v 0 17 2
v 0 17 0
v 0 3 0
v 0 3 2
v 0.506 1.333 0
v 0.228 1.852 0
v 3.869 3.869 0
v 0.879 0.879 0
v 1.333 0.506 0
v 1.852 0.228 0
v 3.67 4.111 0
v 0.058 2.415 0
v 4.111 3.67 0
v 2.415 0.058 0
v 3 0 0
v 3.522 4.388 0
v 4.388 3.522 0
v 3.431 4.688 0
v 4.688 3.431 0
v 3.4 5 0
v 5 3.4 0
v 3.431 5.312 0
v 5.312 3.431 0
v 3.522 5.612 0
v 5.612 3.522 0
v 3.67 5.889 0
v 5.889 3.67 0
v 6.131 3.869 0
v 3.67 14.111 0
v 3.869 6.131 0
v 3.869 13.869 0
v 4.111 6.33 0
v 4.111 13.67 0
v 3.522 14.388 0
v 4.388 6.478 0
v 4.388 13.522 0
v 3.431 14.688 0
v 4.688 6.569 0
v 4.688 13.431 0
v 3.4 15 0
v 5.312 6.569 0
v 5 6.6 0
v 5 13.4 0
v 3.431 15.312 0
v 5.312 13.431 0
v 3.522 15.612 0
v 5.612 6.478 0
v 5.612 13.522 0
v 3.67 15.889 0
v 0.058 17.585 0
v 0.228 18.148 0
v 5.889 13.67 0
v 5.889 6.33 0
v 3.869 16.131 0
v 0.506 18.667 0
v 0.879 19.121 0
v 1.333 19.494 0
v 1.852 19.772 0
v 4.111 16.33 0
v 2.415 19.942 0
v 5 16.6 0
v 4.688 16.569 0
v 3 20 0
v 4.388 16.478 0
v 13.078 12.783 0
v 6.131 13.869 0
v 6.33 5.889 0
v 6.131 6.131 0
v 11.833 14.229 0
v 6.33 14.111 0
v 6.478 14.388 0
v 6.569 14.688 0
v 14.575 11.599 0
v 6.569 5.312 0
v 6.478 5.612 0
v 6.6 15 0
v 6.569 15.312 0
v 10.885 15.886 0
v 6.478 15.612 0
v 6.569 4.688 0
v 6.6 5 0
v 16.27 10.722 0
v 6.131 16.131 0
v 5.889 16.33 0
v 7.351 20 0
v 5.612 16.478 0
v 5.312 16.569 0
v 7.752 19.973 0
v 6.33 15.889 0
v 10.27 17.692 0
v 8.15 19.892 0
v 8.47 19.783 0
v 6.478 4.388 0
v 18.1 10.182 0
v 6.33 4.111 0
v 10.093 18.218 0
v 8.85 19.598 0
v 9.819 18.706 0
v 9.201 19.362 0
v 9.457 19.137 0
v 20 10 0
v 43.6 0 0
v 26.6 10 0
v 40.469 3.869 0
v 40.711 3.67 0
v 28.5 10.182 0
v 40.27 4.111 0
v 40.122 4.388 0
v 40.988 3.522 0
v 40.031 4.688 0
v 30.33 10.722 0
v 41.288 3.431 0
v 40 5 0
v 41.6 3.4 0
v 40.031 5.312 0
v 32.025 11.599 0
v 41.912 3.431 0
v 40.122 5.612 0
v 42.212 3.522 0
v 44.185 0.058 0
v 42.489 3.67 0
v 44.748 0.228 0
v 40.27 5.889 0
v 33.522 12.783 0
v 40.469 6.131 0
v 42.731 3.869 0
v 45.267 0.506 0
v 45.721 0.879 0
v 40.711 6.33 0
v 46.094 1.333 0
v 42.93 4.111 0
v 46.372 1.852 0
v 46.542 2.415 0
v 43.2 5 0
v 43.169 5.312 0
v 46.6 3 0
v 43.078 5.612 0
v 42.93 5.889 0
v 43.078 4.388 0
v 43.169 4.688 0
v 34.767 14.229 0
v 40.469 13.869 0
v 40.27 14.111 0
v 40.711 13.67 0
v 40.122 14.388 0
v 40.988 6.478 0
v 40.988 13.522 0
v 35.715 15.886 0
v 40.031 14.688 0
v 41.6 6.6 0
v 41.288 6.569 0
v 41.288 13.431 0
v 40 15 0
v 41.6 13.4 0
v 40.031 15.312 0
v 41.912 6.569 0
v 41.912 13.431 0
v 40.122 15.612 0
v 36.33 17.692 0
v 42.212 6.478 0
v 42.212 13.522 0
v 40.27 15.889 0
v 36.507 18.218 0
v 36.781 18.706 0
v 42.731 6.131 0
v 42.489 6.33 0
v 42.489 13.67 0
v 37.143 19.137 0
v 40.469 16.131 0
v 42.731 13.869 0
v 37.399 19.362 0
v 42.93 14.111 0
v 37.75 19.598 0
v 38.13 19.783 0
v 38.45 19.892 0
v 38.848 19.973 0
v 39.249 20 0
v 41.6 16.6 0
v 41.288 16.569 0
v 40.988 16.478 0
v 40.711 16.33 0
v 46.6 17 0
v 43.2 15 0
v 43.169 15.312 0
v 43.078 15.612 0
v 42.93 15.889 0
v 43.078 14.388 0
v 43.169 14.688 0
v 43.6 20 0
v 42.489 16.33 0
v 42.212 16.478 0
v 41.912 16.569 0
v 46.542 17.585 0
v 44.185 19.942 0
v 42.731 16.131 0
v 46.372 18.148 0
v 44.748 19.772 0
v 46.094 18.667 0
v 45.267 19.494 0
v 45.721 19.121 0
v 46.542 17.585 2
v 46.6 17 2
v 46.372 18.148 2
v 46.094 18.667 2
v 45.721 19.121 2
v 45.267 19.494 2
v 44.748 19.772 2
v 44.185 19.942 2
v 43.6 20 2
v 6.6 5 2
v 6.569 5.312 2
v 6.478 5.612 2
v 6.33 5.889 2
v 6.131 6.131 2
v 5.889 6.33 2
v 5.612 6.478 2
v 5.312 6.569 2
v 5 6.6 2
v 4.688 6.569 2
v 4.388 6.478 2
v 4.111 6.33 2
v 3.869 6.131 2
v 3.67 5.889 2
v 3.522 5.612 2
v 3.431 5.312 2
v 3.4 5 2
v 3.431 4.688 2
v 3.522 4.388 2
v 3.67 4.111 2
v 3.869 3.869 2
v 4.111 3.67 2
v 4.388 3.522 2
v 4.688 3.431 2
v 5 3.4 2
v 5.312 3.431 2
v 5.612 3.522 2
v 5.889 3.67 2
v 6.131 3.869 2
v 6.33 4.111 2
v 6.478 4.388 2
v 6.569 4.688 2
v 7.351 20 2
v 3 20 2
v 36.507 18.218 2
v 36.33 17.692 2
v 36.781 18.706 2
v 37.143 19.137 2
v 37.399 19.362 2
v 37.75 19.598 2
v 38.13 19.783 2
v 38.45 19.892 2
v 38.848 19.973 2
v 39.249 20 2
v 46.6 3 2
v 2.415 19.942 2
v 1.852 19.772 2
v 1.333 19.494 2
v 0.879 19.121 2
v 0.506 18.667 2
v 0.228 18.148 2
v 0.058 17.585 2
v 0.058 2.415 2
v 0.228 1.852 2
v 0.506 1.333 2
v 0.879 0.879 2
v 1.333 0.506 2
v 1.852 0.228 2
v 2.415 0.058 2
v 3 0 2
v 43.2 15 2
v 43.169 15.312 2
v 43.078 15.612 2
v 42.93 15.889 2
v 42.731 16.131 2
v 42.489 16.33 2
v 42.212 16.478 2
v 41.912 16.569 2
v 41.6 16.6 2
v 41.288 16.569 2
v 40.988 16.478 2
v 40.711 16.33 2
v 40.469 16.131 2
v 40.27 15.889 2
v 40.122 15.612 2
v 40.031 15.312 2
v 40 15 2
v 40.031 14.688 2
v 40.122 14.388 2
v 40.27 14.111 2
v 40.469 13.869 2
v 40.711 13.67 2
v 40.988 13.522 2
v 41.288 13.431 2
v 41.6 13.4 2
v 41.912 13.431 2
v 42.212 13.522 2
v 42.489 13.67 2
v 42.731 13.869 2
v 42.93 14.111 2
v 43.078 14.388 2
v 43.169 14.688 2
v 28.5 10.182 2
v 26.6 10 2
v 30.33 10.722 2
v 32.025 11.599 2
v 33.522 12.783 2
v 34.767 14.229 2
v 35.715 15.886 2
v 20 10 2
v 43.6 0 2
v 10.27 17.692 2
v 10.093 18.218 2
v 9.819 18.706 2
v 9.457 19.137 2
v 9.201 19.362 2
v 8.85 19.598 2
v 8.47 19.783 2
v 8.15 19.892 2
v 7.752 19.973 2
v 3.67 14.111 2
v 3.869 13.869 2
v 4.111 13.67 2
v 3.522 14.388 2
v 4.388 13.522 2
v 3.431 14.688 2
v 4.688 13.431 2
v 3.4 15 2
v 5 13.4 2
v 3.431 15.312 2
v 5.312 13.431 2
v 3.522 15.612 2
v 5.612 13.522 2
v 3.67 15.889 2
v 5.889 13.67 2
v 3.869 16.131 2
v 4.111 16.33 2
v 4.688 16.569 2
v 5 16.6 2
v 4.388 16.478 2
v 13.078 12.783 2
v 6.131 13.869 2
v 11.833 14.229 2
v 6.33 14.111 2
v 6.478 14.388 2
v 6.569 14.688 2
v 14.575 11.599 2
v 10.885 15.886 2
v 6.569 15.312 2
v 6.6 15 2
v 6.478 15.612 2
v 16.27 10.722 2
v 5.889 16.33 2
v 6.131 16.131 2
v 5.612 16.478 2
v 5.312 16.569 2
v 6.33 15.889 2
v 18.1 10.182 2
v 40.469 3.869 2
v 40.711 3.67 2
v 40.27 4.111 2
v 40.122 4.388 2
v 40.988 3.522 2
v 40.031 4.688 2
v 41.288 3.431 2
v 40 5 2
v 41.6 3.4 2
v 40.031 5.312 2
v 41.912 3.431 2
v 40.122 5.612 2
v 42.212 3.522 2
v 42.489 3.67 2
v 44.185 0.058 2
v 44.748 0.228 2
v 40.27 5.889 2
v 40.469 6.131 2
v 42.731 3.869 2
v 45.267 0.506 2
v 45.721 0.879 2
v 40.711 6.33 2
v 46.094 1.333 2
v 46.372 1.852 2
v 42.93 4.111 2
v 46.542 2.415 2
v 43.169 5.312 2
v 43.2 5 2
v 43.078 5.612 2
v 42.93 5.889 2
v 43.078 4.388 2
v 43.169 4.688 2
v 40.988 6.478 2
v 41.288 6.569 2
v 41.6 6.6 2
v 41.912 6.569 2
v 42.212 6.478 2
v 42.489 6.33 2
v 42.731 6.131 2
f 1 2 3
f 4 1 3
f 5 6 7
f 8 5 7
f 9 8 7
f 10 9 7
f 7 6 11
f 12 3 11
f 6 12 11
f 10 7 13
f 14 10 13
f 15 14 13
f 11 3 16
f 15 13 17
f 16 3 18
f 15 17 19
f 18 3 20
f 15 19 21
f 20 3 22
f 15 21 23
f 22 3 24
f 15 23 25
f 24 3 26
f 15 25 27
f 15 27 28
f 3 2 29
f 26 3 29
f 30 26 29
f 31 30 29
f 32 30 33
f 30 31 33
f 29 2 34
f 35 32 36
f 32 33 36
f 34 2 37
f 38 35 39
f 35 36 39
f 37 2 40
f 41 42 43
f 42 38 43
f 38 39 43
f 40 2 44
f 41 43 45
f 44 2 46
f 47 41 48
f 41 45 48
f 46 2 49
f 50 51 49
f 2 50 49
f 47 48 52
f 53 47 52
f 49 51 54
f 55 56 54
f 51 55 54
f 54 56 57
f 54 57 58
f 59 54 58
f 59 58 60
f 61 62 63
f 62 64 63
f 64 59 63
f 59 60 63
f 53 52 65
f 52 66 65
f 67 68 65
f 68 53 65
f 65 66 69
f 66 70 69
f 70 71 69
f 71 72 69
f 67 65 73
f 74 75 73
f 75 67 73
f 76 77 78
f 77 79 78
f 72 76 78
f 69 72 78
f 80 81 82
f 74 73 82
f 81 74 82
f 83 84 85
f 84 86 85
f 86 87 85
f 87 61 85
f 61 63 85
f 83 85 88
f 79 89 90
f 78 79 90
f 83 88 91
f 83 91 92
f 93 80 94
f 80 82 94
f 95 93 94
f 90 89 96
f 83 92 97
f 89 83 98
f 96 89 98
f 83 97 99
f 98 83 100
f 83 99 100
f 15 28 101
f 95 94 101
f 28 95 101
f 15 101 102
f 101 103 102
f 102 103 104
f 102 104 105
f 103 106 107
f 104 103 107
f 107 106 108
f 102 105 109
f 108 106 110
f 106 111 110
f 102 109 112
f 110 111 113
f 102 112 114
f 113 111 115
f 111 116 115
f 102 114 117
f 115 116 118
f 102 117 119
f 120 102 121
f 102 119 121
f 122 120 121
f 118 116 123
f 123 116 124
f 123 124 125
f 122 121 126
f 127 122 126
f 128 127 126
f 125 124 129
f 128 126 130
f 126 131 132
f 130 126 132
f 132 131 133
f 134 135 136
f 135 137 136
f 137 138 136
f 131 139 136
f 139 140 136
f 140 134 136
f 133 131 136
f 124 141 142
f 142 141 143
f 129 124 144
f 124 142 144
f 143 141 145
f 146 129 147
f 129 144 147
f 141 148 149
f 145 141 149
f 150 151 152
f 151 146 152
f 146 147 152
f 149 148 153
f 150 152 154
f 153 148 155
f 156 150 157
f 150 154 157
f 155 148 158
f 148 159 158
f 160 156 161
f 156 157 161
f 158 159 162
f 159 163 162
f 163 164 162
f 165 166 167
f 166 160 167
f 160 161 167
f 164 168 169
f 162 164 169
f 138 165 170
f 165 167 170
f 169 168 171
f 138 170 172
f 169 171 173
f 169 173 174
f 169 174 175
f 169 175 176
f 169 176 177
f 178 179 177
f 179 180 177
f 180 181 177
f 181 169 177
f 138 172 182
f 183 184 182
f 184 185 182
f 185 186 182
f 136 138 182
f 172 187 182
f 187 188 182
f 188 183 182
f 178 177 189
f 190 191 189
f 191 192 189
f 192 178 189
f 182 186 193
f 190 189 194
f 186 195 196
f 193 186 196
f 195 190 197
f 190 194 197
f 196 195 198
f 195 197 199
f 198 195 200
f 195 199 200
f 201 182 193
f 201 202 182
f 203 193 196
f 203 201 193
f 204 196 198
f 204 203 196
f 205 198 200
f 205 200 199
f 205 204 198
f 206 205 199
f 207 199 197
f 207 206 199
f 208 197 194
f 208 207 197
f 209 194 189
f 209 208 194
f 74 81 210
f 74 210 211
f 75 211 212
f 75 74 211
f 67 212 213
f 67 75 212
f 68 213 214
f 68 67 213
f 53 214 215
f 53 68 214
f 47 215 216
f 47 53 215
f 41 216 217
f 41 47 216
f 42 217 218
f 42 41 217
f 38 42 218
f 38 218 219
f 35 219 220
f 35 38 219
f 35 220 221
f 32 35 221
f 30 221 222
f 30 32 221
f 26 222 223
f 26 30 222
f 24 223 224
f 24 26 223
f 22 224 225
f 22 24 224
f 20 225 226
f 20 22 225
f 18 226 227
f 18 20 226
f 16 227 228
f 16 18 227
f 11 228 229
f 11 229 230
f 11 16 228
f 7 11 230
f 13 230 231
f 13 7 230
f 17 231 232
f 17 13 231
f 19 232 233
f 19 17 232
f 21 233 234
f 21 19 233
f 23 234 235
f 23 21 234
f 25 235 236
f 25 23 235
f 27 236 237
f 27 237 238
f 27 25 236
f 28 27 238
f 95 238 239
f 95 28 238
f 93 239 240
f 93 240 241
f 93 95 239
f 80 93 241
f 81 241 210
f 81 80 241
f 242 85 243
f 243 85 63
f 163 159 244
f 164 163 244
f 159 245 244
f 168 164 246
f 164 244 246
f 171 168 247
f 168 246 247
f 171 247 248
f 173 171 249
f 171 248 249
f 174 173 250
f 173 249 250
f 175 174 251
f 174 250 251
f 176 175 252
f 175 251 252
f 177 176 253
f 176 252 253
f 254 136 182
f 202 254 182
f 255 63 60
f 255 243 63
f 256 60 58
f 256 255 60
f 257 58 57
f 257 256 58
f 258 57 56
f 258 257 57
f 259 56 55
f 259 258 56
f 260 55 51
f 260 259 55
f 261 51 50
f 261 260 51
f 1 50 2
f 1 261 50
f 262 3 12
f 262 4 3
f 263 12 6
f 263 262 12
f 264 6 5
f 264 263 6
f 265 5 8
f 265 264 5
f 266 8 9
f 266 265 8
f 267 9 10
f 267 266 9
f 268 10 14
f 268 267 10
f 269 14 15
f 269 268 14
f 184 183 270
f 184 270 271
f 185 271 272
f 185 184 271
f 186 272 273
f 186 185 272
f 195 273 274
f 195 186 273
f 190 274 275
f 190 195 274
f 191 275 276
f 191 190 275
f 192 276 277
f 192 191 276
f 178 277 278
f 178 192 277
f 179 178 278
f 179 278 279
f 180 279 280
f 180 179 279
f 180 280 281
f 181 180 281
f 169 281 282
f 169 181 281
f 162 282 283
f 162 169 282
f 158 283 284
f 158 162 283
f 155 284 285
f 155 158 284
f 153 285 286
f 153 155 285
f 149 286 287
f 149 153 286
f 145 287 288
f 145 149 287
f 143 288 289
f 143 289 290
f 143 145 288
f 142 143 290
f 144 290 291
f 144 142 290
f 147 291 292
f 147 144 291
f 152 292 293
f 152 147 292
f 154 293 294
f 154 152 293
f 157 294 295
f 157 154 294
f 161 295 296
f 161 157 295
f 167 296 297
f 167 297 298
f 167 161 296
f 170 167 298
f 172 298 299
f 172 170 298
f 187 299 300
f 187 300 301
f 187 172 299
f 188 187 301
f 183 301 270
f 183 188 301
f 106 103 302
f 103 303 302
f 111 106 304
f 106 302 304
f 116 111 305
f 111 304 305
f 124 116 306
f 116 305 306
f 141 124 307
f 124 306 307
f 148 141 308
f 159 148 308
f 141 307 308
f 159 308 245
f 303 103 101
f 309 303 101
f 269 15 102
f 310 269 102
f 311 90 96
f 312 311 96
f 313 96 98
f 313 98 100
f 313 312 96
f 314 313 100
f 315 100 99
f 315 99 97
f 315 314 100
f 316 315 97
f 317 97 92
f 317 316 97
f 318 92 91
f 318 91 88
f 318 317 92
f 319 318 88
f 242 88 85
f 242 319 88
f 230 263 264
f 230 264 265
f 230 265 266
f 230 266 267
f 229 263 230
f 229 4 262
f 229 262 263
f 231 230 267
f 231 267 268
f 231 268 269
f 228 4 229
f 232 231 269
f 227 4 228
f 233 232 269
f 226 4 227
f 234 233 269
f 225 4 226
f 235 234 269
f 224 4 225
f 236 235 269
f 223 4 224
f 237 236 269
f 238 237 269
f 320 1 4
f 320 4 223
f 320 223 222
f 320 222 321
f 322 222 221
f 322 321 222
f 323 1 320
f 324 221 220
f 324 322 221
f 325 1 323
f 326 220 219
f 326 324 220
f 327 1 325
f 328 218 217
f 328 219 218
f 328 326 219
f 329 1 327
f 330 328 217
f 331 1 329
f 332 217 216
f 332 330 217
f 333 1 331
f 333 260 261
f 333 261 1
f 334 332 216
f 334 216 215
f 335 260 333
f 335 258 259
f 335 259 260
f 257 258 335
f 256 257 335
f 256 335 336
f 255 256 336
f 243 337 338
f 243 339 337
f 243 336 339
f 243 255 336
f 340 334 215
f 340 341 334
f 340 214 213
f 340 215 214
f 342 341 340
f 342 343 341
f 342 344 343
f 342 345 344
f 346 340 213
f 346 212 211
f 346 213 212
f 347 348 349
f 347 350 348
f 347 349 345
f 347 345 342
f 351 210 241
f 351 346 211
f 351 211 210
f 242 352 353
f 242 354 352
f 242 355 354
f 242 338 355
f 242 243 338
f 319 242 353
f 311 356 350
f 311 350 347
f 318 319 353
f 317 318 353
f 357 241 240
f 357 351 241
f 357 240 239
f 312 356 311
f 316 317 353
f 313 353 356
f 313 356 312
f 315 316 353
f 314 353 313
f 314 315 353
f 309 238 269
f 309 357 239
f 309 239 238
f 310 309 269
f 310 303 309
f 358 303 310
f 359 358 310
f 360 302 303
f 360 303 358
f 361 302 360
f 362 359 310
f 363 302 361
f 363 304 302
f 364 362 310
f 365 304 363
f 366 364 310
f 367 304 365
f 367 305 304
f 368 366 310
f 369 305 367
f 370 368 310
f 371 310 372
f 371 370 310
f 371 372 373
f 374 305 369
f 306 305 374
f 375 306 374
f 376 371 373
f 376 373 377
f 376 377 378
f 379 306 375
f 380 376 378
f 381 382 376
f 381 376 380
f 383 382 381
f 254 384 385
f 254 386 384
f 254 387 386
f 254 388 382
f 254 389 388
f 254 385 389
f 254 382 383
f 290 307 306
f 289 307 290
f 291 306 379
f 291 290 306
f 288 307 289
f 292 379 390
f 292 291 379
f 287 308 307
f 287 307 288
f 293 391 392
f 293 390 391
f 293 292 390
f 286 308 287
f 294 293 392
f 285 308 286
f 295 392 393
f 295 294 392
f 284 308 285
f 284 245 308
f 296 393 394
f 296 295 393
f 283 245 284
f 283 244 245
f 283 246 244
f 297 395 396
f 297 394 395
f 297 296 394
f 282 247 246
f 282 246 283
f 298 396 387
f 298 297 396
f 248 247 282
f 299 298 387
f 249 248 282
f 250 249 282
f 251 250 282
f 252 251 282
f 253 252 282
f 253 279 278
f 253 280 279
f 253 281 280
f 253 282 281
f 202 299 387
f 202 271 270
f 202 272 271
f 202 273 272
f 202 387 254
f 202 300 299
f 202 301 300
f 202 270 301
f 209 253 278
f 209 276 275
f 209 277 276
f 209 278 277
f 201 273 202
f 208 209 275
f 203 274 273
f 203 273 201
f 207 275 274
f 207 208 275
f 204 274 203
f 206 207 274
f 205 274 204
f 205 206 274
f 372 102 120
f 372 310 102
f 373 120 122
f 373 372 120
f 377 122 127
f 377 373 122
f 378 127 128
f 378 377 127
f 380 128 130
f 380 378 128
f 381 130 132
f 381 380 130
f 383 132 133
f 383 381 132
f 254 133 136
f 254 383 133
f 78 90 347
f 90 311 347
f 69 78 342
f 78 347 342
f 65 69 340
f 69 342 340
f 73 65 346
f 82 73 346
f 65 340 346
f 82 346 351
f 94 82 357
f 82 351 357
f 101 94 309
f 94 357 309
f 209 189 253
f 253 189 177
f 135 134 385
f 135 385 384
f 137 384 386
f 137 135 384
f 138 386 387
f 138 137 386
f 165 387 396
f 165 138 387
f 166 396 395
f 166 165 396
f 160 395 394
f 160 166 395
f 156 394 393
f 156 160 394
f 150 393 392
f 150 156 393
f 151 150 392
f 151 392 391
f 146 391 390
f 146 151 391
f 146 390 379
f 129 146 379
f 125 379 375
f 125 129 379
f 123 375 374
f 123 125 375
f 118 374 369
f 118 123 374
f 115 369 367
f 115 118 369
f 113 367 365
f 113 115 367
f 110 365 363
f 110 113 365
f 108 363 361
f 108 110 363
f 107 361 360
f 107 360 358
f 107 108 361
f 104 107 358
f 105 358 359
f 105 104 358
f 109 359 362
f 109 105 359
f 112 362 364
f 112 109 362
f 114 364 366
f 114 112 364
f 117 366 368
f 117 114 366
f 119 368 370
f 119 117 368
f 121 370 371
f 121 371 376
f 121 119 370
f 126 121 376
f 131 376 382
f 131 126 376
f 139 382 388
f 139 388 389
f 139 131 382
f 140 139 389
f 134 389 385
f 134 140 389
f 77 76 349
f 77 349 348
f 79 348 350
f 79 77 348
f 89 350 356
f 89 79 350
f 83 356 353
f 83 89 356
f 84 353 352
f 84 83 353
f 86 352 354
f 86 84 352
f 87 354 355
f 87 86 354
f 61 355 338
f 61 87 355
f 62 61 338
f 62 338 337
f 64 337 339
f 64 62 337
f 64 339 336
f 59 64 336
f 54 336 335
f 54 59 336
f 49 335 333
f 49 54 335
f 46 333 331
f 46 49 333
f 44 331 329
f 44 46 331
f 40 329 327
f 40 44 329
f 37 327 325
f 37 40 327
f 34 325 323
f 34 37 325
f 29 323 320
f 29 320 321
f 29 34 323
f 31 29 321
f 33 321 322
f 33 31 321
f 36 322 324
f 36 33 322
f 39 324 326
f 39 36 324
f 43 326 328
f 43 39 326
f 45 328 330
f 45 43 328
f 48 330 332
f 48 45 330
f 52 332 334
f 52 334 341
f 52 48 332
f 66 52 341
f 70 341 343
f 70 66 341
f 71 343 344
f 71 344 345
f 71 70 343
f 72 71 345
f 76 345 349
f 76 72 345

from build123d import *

# Parameters (mm, degrees)
SKETCH_1_R      = 1.6
EXTRUDE_1_DEPTH = 2
FILLET_1_R      = 10
FILLET_2_R      = 3


with BuildPart() as part:
    # ｽｹｯﾁ1 → ﾎﾞｽ - 押し出し1 (new body)
    with BuildSketch(Plane.XY):
        Polygon((0, 20), (0, 0), (46.6, 0), (46.6, 20), (36.6, 20), (36.6, 10), (10, 10), (10, 20), align=None)
        with Locations((5, 5)):
            Circle(SKETCH_1_R, mode=Mode.SUBTRACT)
        with Locations((41.6, 5)):
            Circle(SKETCH_1_R, mode=Mode.SUBTRACT)
        with Locations((5, 15)):
            Circle(SKETCH_1_R, mode=Mode.SUBTRACT)
        with Locations((41.6, 15)):
            Circle(SKETCH_1_R, mode=Mode.SUBTRACT)
    extrude(amount=EXTRUDE_1_DEPTH)

    # ﾌｨﾚｯﾄ1
    fillet_1_edges = [part.edges().sort_by_distance(p)[0] for p in [
        (36.6, 10, 1),
        (10, 10, 1),
    ]]
    fillet(fillet_1_edges, radius=FILLET_1_R - 0.0001)  # a hair under: the kernel refuses the full size

    # ﾌｨﾚｯﾄ2
    fillet_2_edges = [part.edges().sort_by_distance(p)[0] for p in [
        (46.6, 20, 1),
        (46.6, 0, 1),
        (0, 0, 1),
        (0, 20, 1),
        (10, 20, 1),
        (36.6, 20, 1),
    ]]
    fillet(fillet_2_edges, radius=FILLET_2_R)


solid = part.part
